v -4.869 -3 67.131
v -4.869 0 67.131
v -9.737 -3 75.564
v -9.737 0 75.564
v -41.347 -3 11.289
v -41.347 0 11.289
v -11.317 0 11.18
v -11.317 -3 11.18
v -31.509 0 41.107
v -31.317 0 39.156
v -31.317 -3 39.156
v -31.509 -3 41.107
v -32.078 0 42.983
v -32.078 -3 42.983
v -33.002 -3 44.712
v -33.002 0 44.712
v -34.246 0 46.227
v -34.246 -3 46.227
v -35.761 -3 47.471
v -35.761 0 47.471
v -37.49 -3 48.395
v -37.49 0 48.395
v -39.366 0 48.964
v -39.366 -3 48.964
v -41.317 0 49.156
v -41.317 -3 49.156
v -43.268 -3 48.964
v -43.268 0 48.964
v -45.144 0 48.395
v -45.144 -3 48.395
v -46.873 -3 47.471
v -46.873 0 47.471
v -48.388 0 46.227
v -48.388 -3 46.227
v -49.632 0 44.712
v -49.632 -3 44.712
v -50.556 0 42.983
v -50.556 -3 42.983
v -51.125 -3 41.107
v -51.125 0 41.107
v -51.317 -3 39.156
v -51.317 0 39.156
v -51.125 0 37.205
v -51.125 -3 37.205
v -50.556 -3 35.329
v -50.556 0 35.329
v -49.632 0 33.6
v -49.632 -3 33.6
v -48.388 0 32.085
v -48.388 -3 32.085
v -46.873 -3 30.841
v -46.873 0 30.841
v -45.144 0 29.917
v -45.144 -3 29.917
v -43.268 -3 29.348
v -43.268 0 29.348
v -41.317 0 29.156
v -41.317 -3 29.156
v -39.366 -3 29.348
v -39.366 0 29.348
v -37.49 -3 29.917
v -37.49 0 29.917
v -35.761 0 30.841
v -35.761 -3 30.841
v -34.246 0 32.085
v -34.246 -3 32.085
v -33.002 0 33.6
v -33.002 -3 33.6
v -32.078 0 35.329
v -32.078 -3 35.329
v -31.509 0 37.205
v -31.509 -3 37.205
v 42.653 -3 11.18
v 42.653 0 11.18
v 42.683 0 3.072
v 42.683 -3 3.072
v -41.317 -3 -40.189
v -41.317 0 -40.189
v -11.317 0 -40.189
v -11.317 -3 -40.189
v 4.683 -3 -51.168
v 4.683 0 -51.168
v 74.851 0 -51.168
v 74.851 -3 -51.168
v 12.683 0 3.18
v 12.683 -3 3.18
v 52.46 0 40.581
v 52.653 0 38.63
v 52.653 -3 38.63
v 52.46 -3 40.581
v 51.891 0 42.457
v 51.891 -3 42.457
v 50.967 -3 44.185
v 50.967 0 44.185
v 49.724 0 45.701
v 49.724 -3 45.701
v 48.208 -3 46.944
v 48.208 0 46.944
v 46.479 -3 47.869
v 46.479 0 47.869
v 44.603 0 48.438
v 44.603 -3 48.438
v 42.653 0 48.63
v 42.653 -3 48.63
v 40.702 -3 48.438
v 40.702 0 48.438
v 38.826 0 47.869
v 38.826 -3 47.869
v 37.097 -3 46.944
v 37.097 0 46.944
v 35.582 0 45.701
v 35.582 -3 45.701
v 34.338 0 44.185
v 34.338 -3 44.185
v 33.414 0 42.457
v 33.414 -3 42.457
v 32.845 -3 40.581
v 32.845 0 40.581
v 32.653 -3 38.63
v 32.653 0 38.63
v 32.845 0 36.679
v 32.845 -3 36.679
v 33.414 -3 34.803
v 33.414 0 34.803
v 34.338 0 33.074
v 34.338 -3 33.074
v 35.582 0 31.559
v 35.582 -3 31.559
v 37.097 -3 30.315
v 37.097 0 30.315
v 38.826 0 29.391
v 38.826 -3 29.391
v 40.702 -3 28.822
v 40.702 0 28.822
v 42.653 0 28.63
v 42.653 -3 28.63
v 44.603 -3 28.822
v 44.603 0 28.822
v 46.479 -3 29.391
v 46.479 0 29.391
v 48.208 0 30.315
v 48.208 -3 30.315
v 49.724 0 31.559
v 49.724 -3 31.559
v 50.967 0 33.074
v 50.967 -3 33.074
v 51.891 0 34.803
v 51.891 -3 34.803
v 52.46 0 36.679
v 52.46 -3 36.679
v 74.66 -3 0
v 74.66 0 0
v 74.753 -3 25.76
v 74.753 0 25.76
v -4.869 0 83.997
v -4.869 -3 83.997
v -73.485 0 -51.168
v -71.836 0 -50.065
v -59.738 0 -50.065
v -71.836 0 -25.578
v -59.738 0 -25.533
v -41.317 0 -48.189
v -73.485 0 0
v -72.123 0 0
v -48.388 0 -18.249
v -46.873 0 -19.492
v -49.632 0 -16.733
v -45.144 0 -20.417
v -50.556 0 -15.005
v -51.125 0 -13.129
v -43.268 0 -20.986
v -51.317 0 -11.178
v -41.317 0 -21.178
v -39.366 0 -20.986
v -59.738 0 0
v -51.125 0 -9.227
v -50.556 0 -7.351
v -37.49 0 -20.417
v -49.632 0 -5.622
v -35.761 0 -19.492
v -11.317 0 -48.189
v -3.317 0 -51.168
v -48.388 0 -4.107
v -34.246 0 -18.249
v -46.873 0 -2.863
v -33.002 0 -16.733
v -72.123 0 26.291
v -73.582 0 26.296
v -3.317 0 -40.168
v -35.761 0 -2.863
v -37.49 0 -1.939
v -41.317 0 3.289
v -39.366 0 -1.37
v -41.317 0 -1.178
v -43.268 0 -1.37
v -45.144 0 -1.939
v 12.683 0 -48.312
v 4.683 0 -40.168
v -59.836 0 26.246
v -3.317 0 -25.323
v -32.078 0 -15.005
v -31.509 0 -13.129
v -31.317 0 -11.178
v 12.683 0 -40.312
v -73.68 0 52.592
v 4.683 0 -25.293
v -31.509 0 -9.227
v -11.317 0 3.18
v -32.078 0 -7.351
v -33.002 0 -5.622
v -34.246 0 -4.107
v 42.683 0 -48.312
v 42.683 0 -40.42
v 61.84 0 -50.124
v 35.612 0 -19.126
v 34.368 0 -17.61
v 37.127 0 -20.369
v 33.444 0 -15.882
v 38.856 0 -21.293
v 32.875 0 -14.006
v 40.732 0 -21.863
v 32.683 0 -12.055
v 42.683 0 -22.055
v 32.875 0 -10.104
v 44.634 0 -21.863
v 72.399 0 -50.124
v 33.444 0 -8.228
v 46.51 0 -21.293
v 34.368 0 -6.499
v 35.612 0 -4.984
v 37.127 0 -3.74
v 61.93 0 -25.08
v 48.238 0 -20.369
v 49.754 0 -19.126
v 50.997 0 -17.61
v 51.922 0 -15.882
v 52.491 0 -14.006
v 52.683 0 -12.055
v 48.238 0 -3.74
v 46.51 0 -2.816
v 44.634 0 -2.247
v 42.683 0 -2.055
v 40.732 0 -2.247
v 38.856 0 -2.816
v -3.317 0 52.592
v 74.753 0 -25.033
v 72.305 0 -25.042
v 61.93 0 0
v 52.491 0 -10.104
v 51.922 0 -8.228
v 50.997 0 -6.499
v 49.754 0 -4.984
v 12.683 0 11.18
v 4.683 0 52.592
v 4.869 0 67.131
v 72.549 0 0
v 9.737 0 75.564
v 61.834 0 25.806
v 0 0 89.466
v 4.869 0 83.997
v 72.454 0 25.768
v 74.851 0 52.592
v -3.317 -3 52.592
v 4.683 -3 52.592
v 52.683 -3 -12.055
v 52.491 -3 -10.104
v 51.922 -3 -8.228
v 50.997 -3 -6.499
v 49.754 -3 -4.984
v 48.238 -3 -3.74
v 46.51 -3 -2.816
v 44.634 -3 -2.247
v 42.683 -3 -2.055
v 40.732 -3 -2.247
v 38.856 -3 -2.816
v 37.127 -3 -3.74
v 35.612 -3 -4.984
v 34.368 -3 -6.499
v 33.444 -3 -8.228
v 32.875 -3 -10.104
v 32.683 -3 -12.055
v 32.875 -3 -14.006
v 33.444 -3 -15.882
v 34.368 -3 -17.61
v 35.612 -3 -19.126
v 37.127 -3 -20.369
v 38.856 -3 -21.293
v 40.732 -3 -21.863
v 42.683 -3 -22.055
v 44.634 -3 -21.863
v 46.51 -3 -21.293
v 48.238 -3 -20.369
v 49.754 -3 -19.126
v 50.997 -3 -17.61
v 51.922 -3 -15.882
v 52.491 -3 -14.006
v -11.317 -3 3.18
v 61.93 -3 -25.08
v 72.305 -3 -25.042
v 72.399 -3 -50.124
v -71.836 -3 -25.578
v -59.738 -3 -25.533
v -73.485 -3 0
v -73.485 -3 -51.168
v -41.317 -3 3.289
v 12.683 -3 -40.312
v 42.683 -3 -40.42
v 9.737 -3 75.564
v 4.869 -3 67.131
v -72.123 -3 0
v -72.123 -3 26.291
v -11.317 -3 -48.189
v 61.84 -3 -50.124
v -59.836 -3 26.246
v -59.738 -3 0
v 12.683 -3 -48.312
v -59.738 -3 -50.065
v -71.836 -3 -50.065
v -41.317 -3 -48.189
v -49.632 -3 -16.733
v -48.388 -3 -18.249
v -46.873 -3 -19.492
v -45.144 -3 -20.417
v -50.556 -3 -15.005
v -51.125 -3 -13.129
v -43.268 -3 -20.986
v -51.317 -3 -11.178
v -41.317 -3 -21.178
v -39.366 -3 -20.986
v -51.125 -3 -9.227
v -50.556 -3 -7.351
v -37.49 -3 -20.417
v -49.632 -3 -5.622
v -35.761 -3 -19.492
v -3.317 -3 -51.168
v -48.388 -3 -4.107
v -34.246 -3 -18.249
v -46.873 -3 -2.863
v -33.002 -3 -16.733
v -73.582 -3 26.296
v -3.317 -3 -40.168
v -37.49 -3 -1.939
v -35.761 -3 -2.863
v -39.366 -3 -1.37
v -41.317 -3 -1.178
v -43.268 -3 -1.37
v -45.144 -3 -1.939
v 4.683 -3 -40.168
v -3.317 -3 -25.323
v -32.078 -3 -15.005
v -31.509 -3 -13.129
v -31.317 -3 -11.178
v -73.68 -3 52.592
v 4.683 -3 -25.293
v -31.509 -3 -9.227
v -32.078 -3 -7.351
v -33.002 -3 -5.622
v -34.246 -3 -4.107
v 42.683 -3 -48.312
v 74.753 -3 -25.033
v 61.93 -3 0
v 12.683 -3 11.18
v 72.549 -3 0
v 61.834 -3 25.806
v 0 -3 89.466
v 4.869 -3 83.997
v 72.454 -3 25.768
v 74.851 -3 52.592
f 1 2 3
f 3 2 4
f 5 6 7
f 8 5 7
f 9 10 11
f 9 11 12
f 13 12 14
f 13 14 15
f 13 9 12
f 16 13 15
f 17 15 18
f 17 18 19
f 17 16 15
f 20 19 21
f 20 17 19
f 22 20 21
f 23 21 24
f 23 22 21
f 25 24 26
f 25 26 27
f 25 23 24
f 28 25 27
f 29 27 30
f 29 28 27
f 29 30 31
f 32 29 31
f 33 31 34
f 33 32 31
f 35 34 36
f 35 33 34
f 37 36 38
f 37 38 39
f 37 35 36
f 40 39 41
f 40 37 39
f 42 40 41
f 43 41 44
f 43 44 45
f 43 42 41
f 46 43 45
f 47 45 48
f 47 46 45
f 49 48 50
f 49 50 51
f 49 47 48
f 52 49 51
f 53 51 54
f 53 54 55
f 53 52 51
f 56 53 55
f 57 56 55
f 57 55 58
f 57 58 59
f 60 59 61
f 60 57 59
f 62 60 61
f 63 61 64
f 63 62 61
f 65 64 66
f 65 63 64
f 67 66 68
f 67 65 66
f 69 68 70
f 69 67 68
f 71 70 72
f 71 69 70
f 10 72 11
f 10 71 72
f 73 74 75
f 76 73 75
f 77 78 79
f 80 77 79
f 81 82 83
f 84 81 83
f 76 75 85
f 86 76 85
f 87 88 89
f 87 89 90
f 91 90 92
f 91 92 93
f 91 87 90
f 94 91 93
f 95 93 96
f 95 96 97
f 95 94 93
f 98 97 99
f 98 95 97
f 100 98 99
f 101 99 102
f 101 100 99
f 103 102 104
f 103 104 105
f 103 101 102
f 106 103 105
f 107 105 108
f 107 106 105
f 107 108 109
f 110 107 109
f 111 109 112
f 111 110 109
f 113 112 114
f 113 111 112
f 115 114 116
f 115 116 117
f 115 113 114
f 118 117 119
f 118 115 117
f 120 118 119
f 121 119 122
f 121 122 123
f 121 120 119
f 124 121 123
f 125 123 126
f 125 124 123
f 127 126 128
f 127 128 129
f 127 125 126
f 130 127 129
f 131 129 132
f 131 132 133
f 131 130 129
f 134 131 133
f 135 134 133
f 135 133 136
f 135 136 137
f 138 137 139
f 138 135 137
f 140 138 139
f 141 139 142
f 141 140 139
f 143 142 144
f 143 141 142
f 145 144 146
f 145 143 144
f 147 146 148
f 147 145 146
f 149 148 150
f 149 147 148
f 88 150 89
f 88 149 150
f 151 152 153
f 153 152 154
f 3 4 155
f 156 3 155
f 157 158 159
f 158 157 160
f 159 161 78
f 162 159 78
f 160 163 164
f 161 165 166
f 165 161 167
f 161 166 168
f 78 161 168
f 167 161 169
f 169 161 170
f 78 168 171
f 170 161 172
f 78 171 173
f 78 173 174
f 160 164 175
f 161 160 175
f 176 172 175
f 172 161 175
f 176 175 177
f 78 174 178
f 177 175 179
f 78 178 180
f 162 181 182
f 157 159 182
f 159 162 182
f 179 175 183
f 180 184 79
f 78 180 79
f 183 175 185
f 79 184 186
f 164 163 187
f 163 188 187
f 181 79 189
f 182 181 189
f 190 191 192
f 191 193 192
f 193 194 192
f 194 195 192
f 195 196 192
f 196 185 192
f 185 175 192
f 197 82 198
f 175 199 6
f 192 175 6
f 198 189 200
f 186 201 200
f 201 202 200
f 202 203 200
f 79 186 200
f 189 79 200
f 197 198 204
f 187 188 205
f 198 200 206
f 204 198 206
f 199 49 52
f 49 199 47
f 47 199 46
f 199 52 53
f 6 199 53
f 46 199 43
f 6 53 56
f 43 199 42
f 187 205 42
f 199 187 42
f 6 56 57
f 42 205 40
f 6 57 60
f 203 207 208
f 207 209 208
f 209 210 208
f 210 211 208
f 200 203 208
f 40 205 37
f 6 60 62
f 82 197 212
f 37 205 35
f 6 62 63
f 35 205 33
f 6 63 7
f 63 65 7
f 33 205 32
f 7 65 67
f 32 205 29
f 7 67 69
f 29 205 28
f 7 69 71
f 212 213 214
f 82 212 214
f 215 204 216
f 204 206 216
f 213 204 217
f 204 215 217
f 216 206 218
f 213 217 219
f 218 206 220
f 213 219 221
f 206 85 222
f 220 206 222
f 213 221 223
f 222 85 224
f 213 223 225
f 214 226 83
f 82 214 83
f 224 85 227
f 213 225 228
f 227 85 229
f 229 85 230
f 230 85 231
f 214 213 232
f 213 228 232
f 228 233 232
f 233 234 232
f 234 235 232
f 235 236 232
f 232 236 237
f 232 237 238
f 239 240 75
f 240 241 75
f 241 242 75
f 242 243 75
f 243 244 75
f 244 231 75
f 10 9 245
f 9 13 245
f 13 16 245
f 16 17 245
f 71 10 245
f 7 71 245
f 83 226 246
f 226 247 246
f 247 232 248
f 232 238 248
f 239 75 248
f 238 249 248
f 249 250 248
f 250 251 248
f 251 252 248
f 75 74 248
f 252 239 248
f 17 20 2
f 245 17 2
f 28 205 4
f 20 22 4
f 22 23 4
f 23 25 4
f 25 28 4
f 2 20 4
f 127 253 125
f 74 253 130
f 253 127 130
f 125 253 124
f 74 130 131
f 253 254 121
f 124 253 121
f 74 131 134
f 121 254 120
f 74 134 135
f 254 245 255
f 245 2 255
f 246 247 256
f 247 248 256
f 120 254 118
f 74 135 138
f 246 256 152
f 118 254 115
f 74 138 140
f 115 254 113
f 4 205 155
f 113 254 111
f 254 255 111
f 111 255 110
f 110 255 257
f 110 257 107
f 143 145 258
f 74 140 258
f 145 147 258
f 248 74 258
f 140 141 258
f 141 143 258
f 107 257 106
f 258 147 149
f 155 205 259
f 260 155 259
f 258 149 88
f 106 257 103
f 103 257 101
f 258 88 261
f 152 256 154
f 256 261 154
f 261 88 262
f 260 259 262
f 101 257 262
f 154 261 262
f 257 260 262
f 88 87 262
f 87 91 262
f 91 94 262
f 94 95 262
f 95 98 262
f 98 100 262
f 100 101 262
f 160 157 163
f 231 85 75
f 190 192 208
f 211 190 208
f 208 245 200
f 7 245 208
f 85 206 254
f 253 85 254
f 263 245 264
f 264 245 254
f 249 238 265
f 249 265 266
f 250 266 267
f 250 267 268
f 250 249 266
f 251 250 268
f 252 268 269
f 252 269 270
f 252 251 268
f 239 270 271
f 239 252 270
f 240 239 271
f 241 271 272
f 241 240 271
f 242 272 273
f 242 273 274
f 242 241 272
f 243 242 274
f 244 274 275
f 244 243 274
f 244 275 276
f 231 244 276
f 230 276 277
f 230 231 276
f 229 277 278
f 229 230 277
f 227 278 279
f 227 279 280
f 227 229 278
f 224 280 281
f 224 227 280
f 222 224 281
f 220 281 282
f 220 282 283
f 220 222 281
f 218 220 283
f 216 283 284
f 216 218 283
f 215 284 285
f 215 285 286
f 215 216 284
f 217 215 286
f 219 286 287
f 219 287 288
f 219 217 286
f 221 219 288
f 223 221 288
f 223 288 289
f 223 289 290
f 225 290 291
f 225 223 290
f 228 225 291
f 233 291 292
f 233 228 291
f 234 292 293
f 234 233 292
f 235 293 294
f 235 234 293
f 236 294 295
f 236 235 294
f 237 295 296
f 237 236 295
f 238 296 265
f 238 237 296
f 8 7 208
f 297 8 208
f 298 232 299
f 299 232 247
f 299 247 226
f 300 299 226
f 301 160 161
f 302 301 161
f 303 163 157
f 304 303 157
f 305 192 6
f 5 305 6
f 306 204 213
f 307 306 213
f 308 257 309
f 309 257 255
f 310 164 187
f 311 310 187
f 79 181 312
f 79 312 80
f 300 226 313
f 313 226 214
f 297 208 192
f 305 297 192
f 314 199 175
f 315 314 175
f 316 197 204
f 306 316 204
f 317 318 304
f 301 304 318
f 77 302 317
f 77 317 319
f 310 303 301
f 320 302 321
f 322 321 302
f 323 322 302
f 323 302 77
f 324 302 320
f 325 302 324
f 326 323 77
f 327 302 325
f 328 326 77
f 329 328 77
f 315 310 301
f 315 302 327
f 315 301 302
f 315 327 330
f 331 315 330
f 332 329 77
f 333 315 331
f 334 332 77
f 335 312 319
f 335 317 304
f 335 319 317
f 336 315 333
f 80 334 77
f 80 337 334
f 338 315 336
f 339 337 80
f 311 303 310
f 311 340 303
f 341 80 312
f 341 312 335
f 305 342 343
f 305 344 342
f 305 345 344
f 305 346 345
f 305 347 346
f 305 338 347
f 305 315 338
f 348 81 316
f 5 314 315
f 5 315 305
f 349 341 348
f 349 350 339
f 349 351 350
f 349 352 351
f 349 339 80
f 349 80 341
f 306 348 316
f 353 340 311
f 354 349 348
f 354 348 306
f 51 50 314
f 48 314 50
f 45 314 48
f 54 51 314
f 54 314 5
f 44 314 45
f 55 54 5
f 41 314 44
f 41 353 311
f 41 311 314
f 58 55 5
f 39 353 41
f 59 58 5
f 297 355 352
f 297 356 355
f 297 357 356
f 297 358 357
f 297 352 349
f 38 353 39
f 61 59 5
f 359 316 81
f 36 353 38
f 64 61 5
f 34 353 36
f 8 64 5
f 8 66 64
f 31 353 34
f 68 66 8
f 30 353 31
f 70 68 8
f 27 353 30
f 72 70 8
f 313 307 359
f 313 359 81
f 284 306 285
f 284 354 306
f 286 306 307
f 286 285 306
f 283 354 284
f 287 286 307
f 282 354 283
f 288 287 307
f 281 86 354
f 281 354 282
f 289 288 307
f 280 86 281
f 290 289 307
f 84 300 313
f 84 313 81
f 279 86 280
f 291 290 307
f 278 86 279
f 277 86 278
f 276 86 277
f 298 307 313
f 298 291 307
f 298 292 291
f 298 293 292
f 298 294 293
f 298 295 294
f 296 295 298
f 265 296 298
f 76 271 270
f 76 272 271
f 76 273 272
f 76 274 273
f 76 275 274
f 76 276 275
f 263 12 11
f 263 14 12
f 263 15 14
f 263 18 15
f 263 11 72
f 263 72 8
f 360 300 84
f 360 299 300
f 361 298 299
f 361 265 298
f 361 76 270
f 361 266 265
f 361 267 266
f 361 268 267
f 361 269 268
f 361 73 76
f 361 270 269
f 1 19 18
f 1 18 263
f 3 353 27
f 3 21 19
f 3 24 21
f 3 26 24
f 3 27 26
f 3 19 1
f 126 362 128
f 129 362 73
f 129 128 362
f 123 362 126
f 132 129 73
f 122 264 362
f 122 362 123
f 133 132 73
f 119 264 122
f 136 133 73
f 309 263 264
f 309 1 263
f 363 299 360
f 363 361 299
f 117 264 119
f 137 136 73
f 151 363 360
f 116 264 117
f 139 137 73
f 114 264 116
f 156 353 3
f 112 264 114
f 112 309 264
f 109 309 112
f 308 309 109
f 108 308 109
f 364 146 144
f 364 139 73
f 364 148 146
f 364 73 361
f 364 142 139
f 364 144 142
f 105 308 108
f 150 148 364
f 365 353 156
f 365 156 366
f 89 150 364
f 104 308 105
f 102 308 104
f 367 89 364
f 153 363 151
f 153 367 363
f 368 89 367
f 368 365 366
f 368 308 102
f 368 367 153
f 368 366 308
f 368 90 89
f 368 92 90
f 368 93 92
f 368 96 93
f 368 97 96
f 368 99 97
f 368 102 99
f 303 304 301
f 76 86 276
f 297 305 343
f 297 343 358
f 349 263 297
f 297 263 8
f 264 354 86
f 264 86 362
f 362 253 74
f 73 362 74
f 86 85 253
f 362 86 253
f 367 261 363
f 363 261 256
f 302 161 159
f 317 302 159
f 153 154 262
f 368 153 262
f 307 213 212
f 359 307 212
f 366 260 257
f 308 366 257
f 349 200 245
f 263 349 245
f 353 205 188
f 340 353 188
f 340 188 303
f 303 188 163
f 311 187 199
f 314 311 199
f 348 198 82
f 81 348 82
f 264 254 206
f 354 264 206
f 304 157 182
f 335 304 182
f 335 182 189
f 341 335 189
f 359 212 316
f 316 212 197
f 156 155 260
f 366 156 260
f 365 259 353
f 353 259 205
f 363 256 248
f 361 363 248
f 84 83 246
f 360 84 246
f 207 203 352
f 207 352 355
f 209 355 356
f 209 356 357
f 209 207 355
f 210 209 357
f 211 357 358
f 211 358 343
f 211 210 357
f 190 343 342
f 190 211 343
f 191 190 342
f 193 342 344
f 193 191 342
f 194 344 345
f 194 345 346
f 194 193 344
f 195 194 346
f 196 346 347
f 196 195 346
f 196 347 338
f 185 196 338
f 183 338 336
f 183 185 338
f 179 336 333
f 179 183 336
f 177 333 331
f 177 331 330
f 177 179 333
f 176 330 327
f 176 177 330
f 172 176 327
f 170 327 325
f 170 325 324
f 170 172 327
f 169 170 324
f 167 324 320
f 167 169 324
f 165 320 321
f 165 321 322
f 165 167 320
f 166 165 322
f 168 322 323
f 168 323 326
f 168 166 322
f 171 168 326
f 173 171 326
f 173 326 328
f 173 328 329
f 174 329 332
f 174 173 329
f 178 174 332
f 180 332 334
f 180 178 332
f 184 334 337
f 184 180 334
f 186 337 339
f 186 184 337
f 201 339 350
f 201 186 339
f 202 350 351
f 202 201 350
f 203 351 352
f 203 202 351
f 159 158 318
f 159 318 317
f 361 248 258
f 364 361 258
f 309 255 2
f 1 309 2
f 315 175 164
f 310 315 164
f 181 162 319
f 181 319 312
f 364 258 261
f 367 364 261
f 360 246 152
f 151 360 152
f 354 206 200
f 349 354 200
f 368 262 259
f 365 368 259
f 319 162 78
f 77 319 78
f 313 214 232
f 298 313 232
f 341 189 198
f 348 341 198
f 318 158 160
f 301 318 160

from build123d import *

# Parameters (mm, degrees)
F0_R     = 10
F0_W     = 30
F0_H     = 8
F1_DEPTH = 3
F2_DEPTH = 3
F0_W_2   = 12.0982
F0_H_2   = 1.102668
F3_DEPTH = 3


with BuildPart() as f1:
    # F0 (on Front) → F1 (new body)
    with BuildSketch(Plane.XZ):
        Polygon((0, 89.465775), (-73.68011, 52.592348), (-3.317016, 52.592348), (4.682984, 52.592348), (74.850552, 52.592348), align=None)
        Polygon((9.737339, 75.563721), (4.86867, 67.130938), (-4.86867, 67.130938), (-9.737339, 75.563721), (-4.86867, 83.996505), (4.86867, 83.996505), align=None, mode=Mode.SUBTRACT)
        Polygon((-73.68011, 52.592348), (-73.582347, 26.296174), (-72.12289, 26.290895), (-59.835819, 26.246452), (-3.317016, 26.042022), (-3.317016, 52.592348), align=None)
        with Locations((-41.317016, 39.155915)):
            Circle(F0_R, mode=Mode.SUBTRACT)
        Polygon((74.850552, 52.592348), (4.682984, 52.592348), (4.682984, 26.013086), (61.834292, 25.806368), (72.453672, 25.767957), (74.753497, 25.759638), align=None)
        with Locations((42.65259, 38.629778)):
            Circle(F0_R, mode=Mode.SUBTRACT)
        Polygon((4.682984, 26.013086), (4.682984, 0), (61.930233, 0), (61.834292, 25.806368), align=None)
        Polygon((42.682735, 3.071828), (12.682931, 3.180338), (12.682931, 11.180175), (42.65259, 11.180175), align=None, mode=Mode.SUBTRACT)
        Polygon((-59.835819, 26.246452), (-59.738242, 0), (-3.317016, 0), (-3.317016, 26.042022), align=None)
        Polygon((-11.317016, 11.180175), (-11.317016, 3.180338), (-41.31682, 3.288848), (-41.346562, 11.288793), align=None, mode=Mode.SUBTRACT)
        Polygon((-73.484585, 0), (-73.484585, -25.583768), (-71.836442, -25.577641), (-59.738242, -25.532663), (-3.317016, -25.322903), (-3.317016, 0), (-59.738242, 0), (-72.12289, 0), align=None)
        with Locations((-41.317016, -11.177788)):
            Circle(F0_R, mode=Mode.SUBTRACT)
        Polygon((4.682984, 0), (4.682984, -25.293161), (61.930233, -25.08033), (72.305258, -25.041758), (74.753389, -25.032656), (74.660324, 0), (72.549471, 0), (61.930233, 0), align=None)
        with Locations((42.682735, -12.054683)):
            Circle(F0_R, mode=Mode.SUBTRACT)
        Polygon((-59.738242, -50.064869), (-59.738242, -51.167537), (-3.317016, -51.167537), (-3.317016, -40.167537), (4.682984, -40.167537), (4.682984, -51.167537), (61.835875, -51.167537), (61.839649, -50.124135), (61.930233, -25.08033), (4.682984, -25.293161), (-3.317016, -25.322903), (-59.738242, -25.532663), align=None)
        with Locations((-26.317016, -44.189357)):
            Rectangle(F0_W, F0_H, mode=Mode.SUBTRACT)
        Polygon((12.682931, -48.311945), (12.682931, -40.311945), (42.682735, -40.420455), (42.682931, -48.311945), align=None, mode=Mode.SUBTRACT)
    extrude(amount=F1_DEPTH)

    # F0 (on Front) → F2 (join)
    with BuildSketch(Plane.XZ):
        Polygon((-73.582347, 26.296174), (-73.484585, 0), (-72.12289, 0), (-72.12289, 26.290895), align=None)
        Polygon((-73.484585, -25.583768), (-73.484585, -51.167537), (-71.836442, -51.167537), (-71.836442, -50.064869), (-71.836442, -25.577641), align=None)
        Polygon((74.660324, 0), (74.753497, 25.759638), (72.453672, 25.767957), (72.549471, 0), align=None)
        Polygon((72.398508, -50.124135), (72.402387, -51.167537), (74.850552, -51.167537), (74.753389, -25.032656), (72.305258, -25.041758), align=None)
    extrude(amount=F2_DEPTH)

    # F0 (on Front) → F3 (join)
    with BuildSketch(Plane.XZ):
        Polygon((61.839649, -50.124135), (61.835875, -51.167537), (72.402387, -51.167537), (72.398508, -50.124135), align=None)
        with Locations((-65.787342, -50.616203)):
            Rectangle(F0_W_2, F0_H_2)
    extrude(amount=F3_DEPTH)


solid = f1.part
